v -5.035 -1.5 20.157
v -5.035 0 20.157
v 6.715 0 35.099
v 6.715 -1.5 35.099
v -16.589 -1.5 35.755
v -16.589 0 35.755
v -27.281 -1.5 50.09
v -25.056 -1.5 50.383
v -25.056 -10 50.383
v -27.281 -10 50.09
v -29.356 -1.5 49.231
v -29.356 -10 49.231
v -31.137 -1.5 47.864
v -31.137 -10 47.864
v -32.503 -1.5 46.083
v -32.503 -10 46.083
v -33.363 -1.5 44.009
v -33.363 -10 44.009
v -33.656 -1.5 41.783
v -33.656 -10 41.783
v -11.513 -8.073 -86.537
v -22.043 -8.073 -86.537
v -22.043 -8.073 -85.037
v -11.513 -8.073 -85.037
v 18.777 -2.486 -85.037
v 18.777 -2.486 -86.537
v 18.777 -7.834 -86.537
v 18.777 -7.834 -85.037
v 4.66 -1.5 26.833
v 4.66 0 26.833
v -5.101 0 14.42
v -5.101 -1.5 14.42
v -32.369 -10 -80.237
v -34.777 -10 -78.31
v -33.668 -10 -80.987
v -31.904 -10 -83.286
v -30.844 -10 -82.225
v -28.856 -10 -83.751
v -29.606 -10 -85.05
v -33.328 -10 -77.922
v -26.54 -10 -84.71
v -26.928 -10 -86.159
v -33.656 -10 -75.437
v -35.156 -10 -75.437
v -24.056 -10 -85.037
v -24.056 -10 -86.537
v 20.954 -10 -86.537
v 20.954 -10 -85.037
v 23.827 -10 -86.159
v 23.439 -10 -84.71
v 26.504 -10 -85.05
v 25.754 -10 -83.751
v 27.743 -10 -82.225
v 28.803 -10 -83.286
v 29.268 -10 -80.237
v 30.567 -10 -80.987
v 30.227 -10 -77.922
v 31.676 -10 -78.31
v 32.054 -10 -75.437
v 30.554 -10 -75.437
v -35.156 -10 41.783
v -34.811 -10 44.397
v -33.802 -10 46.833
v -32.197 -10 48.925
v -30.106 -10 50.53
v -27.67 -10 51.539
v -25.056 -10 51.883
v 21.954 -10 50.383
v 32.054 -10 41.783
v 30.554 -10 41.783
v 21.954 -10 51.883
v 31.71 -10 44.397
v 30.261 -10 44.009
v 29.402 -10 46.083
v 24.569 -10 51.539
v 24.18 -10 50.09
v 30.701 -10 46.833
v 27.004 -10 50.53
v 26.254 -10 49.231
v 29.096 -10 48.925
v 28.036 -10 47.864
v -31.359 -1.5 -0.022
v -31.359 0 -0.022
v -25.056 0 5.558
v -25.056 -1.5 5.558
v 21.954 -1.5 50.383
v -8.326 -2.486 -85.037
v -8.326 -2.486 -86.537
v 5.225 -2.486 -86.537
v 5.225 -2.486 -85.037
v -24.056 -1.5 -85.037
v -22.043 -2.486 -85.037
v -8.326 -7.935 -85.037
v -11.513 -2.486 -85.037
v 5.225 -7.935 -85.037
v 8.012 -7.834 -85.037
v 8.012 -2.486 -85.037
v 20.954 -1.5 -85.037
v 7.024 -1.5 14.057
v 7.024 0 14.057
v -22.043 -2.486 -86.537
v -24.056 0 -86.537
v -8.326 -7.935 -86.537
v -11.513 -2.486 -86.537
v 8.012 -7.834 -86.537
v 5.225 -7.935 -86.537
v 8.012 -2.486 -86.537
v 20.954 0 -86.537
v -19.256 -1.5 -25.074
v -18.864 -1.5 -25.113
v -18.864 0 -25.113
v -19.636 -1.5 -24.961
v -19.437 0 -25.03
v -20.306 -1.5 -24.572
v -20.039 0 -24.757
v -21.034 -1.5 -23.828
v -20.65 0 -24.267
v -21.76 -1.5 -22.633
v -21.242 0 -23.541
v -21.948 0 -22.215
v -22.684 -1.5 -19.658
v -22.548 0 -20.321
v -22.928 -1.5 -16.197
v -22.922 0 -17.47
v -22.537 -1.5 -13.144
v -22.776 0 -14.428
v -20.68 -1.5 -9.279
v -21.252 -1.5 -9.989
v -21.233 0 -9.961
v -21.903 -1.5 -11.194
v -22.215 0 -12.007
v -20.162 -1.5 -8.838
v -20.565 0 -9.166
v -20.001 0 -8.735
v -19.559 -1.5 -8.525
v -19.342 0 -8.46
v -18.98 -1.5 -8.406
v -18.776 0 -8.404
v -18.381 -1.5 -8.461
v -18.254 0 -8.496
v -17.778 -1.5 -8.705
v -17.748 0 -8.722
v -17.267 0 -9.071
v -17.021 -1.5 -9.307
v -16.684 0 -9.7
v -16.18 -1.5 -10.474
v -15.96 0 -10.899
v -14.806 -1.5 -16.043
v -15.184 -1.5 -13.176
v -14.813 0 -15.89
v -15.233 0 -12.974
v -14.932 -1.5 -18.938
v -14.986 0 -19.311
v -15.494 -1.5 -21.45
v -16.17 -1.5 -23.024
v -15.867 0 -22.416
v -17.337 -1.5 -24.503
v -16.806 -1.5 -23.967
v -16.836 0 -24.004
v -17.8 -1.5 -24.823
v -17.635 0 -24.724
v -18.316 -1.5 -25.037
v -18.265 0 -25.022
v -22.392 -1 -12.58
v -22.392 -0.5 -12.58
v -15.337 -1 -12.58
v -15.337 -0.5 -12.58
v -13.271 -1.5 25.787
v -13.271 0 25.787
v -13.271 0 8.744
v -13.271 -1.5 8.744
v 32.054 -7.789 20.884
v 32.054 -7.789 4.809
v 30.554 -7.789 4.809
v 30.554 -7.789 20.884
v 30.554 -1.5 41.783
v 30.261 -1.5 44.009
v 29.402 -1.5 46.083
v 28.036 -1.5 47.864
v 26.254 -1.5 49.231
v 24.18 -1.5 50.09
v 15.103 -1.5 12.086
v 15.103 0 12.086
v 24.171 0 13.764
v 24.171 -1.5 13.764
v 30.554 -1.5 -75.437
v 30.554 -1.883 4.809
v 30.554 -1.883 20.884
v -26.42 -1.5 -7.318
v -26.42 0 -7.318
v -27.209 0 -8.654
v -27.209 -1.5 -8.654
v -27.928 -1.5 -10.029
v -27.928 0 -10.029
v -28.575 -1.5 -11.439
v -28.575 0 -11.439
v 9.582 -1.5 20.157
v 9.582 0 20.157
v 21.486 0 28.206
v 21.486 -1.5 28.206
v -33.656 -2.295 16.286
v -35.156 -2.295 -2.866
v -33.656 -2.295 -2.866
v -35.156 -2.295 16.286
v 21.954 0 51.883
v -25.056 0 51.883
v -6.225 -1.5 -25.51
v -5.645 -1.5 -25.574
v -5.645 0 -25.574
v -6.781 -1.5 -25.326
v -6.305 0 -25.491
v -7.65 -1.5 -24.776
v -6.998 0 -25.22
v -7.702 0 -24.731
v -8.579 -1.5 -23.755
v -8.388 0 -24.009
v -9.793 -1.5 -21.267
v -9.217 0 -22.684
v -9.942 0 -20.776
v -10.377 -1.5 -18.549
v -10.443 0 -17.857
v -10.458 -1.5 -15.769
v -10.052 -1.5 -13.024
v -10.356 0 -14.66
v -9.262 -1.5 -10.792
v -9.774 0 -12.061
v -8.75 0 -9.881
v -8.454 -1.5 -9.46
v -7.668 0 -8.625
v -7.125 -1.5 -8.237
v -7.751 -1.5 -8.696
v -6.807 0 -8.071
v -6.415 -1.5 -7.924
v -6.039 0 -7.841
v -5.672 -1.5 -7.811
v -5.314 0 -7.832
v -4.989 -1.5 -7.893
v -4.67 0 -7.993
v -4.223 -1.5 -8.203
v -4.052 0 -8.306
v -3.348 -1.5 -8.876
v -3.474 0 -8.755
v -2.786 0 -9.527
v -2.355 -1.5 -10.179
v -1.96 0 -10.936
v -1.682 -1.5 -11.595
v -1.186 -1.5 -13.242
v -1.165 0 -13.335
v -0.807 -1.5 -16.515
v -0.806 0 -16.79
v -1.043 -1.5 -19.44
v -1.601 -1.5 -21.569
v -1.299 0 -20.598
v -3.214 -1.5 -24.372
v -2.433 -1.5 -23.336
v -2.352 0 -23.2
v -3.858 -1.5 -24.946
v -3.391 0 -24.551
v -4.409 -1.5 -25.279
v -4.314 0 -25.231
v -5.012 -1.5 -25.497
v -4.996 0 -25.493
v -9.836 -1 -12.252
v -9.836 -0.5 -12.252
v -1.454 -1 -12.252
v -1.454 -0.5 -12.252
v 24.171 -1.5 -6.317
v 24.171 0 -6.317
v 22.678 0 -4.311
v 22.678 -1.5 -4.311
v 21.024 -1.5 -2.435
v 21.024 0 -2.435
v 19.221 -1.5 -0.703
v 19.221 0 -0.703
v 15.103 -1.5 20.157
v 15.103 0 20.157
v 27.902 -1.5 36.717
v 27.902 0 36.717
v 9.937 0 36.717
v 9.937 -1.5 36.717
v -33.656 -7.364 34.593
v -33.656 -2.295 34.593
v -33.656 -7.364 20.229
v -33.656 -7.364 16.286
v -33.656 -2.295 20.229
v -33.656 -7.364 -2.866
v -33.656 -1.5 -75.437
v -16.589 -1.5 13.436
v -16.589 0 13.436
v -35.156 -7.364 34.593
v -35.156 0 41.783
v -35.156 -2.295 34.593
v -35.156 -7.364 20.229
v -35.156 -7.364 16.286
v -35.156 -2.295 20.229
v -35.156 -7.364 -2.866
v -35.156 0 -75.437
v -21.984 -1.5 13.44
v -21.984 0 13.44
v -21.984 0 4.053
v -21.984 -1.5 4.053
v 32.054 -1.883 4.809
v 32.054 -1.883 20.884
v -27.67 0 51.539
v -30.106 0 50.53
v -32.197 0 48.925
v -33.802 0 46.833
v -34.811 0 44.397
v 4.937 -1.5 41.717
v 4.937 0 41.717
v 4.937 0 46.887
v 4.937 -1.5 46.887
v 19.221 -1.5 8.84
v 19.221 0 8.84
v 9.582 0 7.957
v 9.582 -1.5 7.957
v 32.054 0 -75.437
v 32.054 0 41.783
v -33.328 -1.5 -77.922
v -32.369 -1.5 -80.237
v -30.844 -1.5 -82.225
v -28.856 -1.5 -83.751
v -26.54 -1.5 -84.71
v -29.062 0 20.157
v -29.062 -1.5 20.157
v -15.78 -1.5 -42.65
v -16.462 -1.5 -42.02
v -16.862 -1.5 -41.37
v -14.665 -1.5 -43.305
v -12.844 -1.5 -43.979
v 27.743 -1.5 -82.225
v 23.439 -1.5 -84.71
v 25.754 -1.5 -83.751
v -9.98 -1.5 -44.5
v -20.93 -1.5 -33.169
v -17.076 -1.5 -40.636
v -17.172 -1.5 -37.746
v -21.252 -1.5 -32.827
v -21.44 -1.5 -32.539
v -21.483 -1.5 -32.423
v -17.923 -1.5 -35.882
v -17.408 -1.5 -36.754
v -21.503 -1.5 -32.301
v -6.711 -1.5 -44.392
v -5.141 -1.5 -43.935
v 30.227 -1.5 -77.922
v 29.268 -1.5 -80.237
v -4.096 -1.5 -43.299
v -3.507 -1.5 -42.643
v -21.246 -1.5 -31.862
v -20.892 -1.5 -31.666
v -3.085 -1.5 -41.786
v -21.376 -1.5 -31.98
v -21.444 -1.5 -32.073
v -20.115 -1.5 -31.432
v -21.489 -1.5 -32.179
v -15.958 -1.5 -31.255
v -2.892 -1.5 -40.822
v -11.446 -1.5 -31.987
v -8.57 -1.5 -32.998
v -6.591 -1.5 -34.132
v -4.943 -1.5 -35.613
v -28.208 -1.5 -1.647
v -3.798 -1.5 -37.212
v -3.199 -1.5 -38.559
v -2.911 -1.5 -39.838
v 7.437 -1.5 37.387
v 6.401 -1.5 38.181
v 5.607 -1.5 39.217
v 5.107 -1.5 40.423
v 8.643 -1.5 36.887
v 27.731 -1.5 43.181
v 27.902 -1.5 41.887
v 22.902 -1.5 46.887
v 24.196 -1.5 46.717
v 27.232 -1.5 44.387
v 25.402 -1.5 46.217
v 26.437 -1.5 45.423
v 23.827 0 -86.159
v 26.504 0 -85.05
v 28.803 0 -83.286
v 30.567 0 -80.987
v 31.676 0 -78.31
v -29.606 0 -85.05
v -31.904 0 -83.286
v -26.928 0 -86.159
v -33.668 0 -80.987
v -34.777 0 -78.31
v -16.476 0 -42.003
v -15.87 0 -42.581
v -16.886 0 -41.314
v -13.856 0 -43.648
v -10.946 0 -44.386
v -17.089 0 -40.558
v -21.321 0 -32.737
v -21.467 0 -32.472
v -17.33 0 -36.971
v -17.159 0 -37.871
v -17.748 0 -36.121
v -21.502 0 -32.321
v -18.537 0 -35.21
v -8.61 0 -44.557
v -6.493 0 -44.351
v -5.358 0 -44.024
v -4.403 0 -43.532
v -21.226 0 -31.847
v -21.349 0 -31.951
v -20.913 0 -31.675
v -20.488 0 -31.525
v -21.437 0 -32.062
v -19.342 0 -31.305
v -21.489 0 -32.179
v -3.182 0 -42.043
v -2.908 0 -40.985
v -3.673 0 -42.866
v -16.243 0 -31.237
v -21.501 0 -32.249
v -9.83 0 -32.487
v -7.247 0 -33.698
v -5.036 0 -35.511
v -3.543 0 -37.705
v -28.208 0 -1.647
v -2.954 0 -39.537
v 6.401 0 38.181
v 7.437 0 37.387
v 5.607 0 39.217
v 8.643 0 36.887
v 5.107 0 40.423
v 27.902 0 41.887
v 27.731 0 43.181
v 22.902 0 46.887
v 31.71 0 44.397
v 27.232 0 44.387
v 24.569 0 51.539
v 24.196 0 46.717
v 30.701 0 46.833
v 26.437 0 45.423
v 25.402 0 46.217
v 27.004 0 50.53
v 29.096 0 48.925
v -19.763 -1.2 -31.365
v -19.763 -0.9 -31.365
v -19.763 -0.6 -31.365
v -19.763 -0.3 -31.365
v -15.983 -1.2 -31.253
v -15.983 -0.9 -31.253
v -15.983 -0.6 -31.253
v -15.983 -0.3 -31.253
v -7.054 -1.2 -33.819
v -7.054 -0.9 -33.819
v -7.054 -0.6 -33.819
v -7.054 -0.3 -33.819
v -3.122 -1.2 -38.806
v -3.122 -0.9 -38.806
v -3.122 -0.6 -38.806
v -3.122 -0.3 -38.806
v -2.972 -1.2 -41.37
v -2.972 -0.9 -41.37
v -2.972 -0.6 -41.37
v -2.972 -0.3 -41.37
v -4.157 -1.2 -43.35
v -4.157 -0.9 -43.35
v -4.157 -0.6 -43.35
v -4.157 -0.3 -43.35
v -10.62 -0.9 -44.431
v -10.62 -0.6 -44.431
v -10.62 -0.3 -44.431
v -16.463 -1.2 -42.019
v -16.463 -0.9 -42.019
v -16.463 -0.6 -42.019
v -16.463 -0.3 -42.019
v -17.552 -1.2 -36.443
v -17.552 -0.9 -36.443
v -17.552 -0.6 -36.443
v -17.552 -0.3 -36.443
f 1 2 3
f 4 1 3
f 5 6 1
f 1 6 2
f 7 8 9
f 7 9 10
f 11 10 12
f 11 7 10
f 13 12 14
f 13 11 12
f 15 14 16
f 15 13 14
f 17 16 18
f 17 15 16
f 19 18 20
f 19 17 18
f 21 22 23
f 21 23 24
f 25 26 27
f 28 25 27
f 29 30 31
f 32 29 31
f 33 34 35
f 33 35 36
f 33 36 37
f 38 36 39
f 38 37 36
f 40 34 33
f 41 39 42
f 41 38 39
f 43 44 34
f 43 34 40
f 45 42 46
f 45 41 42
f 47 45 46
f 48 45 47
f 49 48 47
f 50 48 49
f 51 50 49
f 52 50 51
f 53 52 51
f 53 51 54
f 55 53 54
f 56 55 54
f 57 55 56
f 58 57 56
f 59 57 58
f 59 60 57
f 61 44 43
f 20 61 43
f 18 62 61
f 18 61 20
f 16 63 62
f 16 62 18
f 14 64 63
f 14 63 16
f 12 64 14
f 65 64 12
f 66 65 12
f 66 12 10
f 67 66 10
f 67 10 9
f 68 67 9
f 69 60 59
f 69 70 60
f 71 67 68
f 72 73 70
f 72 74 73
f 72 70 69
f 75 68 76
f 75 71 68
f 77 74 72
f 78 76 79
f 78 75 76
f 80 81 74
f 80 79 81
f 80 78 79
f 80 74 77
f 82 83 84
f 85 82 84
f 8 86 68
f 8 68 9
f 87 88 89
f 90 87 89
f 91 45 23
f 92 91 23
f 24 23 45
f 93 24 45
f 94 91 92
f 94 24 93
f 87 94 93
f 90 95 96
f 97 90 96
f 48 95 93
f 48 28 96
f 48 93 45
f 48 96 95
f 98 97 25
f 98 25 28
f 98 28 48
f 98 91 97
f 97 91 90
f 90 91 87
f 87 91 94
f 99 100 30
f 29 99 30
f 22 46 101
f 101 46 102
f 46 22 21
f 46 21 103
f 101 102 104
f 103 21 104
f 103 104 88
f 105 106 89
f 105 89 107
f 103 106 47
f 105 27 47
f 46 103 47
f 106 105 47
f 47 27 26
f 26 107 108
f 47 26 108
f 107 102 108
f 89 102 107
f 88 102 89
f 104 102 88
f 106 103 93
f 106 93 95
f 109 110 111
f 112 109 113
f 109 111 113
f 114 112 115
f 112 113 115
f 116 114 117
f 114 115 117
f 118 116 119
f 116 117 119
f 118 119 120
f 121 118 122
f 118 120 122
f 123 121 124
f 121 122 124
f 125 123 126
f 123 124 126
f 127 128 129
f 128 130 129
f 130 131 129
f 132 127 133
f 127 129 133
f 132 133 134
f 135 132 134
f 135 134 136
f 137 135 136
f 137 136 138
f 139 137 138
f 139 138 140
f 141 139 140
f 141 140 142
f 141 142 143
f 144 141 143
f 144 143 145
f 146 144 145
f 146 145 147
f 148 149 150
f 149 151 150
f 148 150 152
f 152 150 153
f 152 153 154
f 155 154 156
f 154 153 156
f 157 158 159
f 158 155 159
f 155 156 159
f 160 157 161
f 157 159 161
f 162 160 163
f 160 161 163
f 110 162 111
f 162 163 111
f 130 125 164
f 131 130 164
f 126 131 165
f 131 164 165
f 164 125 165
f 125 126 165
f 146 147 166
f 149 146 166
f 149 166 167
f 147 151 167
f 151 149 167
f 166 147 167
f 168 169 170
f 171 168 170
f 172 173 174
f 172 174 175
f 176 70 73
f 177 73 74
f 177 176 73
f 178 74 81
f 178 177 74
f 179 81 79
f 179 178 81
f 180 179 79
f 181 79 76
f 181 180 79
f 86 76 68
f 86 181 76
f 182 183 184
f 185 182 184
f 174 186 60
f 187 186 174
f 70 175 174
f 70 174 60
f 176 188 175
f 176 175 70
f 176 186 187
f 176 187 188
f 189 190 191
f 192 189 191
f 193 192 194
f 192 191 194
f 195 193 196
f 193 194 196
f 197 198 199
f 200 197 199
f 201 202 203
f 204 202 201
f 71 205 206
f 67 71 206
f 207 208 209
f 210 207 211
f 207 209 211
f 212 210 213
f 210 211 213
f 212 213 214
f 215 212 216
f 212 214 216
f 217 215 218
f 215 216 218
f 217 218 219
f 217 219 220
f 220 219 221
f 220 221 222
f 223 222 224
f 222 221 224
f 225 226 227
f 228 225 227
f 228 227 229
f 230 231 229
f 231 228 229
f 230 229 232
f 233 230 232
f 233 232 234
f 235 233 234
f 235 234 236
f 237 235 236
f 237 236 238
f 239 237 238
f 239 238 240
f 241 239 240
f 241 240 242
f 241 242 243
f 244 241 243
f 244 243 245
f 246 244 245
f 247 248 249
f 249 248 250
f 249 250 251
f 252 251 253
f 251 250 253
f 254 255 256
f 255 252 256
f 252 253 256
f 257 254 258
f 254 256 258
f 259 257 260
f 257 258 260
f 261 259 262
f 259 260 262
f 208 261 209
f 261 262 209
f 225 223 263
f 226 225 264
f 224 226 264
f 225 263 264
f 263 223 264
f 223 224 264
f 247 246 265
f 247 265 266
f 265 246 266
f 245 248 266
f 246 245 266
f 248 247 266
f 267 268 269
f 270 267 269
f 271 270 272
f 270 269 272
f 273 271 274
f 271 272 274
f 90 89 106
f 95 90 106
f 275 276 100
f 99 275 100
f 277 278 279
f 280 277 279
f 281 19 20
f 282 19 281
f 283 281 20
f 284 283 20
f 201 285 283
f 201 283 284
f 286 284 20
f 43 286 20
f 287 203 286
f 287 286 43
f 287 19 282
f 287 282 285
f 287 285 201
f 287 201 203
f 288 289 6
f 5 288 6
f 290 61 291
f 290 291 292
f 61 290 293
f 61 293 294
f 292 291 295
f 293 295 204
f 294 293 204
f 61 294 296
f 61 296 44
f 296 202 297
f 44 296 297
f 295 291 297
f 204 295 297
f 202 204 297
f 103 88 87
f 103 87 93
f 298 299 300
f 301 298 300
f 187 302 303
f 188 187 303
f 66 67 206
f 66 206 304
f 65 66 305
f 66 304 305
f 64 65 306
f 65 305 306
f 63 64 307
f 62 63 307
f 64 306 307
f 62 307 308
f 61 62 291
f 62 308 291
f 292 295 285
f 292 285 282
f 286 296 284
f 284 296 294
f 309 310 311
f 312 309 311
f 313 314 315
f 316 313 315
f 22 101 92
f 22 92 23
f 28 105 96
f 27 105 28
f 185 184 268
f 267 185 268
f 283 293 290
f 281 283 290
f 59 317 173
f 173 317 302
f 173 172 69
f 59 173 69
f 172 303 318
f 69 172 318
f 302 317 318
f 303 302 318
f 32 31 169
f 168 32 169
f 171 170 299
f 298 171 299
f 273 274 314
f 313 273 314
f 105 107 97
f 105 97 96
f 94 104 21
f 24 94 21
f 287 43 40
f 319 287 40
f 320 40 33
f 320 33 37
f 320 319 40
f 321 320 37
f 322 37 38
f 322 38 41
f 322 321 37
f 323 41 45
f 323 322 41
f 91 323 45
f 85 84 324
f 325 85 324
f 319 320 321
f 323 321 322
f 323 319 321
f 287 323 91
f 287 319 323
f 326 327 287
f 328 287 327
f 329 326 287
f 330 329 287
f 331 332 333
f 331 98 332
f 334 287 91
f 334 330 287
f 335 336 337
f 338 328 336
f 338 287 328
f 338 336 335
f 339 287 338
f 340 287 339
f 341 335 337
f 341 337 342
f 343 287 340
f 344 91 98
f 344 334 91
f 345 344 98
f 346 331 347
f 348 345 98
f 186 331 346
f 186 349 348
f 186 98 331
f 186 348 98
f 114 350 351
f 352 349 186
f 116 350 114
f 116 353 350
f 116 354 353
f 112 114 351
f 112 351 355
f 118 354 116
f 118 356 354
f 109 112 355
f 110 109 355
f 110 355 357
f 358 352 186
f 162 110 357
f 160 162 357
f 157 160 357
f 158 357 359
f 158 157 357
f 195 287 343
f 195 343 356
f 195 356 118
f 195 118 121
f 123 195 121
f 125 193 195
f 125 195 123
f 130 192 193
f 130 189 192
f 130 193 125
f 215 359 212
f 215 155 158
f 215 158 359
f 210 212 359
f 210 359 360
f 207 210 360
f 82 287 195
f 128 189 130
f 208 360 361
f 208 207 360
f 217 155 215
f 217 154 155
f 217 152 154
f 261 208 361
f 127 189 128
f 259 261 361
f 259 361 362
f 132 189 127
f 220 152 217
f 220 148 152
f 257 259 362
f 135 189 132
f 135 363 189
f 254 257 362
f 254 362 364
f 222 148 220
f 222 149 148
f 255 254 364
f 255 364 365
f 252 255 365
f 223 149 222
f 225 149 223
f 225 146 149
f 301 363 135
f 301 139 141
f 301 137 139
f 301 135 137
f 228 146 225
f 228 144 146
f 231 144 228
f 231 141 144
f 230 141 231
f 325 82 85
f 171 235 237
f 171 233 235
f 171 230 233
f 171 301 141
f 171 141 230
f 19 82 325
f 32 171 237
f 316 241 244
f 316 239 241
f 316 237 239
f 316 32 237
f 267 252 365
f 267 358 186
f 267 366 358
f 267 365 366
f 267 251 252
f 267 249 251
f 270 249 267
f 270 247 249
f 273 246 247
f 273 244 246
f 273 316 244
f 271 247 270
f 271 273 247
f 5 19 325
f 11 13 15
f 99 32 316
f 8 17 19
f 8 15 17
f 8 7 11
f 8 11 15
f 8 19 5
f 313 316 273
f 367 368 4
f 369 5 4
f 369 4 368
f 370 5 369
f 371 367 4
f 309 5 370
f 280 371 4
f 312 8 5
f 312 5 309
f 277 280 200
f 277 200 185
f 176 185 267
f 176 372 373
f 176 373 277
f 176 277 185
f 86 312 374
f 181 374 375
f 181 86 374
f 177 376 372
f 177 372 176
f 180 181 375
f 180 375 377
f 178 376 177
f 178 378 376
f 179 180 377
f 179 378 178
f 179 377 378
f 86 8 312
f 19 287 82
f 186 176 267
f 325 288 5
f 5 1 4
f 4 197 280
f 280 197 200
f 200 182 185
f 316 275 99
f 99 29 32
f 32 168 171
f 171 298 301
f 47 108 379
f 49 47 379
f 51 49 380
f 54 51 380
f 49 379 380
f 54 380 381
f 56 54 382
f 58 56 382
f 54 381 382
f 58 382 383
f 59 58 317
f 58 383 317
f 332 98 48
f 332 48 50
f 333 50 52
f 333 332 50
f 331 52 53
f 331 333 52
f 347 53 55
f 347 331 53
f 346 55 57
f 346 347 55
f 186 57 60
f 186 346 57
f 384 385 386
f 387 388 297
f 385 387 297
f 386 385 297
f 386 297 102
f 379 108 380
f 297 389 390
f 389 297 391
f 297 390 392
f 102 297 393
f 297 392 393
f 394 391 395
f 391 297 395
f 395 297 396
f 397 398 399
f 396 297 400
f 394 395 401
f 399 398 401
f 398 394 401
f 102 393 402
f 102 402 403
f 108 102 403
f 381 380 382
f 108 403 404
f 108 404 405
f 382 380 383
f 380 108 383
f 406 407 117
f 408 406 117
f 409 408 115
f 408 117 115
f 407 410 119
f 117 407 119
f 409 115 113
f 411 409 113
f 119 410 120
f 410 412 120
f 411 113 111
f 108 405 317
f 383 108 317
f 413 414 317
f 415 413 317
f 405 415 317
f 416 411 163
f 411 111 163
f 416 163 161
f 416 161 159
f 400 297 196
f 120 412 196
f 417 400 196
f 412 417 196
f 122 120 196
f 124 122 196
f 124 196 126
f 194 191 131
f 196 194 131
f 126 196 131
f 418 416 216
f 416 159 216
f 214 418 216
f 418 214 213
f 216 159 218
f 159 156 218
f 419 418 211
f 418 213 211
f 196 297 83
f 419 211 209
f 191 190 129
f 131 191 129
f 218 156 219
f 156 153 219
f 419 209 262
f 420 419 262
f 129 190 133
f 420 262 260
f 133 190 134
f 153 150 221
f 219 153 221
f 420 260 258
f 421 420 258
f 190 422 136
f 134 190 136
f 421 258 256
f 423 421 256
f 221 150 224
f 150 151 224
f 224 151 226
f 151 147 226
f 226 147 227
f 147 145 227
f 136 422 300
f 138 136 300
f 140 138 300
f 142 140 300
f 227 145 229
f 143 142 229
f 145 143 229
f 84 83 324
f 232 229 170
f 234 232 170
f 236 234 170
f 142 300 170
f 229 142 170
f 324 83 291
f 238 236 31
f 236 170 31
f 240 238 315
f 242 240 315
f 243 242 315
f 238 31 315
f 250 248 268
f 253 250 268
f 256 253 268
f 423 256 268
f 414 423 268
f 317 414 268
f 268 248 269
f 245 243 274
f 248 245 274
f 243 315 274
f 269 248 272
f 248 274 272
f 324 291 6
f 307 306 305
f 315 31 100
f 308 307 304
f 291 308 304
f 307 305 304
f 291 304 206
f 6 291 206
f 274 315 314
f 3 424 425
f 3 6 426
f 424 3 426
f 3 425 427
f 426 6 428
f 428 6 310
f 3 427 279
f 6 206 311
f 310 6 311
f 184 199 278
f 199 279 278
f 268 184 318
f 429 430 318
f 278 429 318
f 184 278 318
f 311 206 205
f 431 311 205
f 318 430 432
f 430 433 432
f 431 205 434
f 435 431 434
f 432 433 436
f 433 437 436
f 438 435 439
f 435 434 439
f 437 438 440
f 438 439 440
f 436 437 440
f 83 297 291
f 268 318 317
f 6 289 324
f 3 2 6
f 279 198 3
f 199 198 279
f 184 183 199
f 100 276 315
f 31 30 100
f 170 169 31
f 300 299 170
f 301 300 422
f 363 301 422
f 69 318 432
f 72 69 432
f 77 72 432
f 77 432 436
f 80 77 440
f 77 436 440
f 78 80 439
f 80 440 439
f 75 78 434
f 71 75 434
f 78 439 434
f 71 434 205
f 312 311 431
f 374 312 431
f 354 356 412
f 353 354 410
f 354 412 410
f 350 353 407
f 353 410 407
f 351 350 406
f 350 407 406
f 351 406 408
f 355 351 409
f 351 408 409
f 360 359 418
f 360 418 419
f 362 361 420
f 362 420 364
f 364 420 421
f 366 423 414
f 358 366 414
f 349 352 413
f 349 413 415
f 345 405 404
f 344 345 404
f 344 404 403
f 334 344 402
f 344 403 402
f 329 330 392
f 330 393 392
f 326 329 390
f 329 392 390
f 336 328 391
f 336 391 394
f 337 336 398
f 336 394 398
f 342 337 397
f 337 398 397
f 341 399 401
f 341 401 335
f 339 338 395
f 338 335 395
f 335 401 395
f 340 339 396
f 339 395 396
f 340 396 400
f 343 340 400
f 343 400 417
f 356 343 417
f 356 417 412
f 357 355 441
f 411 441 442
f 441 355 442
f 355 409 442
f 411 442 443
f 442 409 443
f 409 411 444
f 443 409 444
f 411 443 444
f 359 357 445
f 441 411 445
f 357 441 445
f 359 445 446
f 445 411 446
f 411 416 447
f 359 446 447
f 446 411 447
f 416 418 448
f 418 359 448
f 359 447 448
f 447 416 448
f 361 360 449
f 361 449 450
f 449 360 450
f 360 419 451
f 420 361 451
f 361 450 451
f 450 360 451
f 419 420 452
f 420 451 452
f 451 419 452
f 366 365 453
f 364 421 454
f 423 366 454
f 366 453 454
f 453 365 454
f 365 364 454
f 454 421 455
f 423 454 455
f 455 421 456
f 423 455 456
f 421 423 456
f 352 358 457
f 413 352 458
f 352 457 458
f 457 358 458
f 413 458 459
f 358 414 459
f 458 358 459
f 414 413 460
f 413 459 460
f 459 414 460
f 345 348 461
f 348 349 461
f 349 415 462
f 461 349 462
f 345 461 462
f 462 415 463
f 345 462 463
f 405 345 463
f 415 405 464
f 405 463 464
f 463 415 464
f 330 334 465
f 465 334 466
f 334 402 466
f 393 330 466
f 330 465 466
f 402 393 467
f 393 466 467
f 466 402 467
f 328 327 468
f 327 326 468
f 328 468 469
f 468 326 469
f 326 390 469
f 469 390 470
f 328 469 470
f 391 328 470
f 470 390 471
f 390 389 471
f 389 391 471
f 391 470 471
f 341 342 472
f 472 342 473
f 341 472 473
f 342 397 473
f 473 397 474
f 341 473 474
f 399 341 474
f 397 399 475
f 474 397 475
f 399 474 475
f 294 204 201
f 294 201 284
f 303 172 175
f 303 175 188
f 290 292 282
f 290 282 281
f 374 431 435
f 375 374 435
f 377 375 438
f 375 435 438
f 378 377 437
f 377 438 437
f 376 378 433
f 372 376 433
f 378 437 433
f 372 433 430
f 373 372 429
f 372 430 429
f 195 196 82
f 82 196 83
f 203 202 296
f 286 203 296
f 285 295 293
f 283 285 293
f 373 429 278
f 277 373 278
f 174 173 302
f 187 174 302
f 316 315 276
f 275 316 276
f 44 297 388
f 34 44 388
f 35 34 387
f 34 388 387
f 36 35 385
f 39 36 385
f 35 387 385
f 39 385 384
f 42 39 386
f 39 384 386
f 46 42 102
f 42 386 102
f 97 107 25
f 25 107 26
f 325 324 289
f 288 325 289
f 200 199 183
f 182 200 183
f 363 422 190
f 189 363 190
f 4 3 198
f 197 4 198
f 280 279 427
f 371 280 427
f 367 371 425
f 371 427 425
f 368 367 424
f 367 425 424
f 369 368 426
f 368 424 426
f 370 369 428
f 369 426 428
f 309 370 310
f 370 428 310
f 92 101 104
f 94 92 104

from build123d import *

# Parameters (mm, degrees)
F1_DEPTH  = 10
F2_T      = -2.5
F4_DEPTH  = 25
F5_DEPTH  = 10
F6_DEPTH  = 10
F7_T      = -1.5
F8_W      = 5.0696202088
F8_H      = 19.1518978681
F8_H_2    = 14.3639231101
F9_DEPTH  = 25
F10_W     = 10.5292941444
F10_H     = 5.5865490576
F10_W_2   = 13.5512258646
F10_H_2   = 5.4485995788
F10_W_3   = 10.7643418014
F10_H_3   = 5.3474996239
F11_DEPTH = 25
F12_W     = 5.9053241275
F12_H     = 16.0756031983
F13_DEPTH = 10
F15_DEPTH = 25
F17_DEPTH = 25


with BuildPart() as f1:
    # F0 (on Front) → F1 (new body)
    with BuildSketch(Plane.XZ):
        with BuildLine():
            Line((21.9544503482, 51.8828080004), (-25.0555496518, 51.8828080004))
            ThreePointArc((-25.0555496518, 51.8828080004), (-32.1973281418, 48.9245864904), (-35.1555496518, 41.7828080004))
            Line((-35.1555496518, 41.7828080004), (-35.1555496518, -75.4371919996))
            ThreePointArc((-35.1555496518, -75.4371919996), (-31.904434923, -83.2860772707), (-24.0555496518, -86.5371919996))
            Line((-24.0555496518, -86.5371919996), (20.9544503482, -86.5371919996))
            ThreePointArc((20.9544503482, -86.5371919996), (28.8033356193, -83.2860772707), (32.0544503482, -75.4371919996))
            Line((32.0544503482, -75.4371919996), (32.0544503482, 41.7828080004))
            ThreePointArc((32.0544503482, 41.7828080004), (29.0962288381, 48.9245864904), (21.9544503482, 51.8828080004))
        make_face()
    extrude(amount=F1_DEPTH)

    # F2
    f2_openings = [f1.faces().sort_by_distance(p)[0] for p in [
        (-1.55055, -10, -17.262302),
    ]]
    offset(amount=F2_T, openings=f2_openings)

    # F4 (cut): a face of the model
    f4_faces = [f1.faces().sort_by_distance(p)[0] for p in [
        (-1.5505496518, -2.5, -17.2732166404),
    ]]
    extrude(f4_faces, amount=-F4_DEPTH, mode=Mode.SUBTRACT)

    # F0 (on Front) → F5 (join)
    with BuildSketch(Plane.XZ):
        with BuildLine():
            Line((21.9544503482, 51.8828080004), (-25.0555496518, 51.8828080004))
            ThreePointArc((-25.0555496518, 51.8828080004), (-32.1973281418, 48.9245864904), (-35.1555496518, 41.7828080004))
            Line((-35.1555496518, 41.7828080004), (-35.1555496518, -75.4371919996))
            ThreePointArc((-35.1555496518, -75.4371919996), (-31.904434923, -83.2860772707), (-24.0555496518, -86.5371919996))
            Line((-24.0555496518, -86.5371919996), (20.9544503482, -86.5371919996))
            ThreePointArc((20.9544503482, -86.5371919996), (28.8033356193, -83.2860772707), (32.0544503482, -75.4371919996))
            Line((32.0544503482, -75.4371919996), (32.0544503482, 41.7828080004))
            ThreePointArc((32.0544503482, 41.7828080004), (29.0962288381, 48.9245864904), (21.9544503482, 51.8828080004))
        make_face()
    extrude(amount=F5_DEPTH)

    # F0 (on Front) → F6 (join)
    with BuildSketch(Plane.XZ):
        with BuildLine():
            Line((21.9544503482, 51.8828080004), (-25.0555496518, 51.8828080004))
            ThreePointArc((-25.0555496518, 51.8828080004), (-32.1973281418, 48.9245864904), (-35.1555496518, 41.7828080004))
            Line((-35.1555496518, 41.7828080004), (-35.1555496518, -75.4371919996))
            ThreePointArc((-35.1555496518, -75.4371919996), (-31.904434923, -83.2860772707), (-24.0555496518, -86.5371919996))
            Line((-24.0555496518, -86.5371919996), (20.9544503482, -86.5371919996))
            ThreePointArc((20.9544503482, -86.5371919996), (28.8033356193, -83.2860772707), (32.0544503482, -75.4371919996))
            Line((32.0544503482, -75.4371919996), (32.0544503482, 41.7828080004))
            ThreePointArc((32.0544503482, 41.7828080004), (29.0962288381, 48.9245864904), (21.9544503482, 51.8828080004))
        make_face()
    extrude(amount=F6_DEPTH)

    # F7
    f7_openings = [f1.faces().sort_by_distance(p)[0] for p in [
        (-1.55055, -10, -17.262302),
    ]]
    offset(amount=F7_T, openings=f7_openings)

    # F8 (on face) → F9 (cut)
    with BuildSketch(Plane(origin=(-35.1555496518, 0, 0), x_dir=(0, -1, 0), z_dir=(-1, 0, 0))):
        with Locations((4.8295374727, 6.7098989384)):
            Rectangle(F8_W, F8_H)
        with Locations((4.8295374727, 27.4108457379)):
            Rectangle(F8_W, F8_H_2)
    extrude(amount=-F9_DEPTH, mode=Mode.SUBTRACT)

    # F10 (on face) → F11 (cut)
    with BuildSketch(Plane(origin=(0, 0, -86.5371919996), x_dir=(1, 0, 0), z_dir=(0, 0, -1))):
        with Locations((-16.7780660558, 5.2797452663)):
            Rectangle(F10_W, F10_H)
        with Locations((-1.5505496518, 5.2107705269)):
            Rectangle(F10_W_2, F10_H_2)
        with Locations((13.3945420384, 5.1602205494)):
            Rectangle(F10_W_3, F10_H_3)
    extrude(amount=-F11_DEPTH, mode=Mode.SUBTRACT)

    # F12 (on face) → F13 (cut)
    with BuildSketch(Plane.YZ.offset(32.0544503482)):
        with Locations((-4.8359625507, 12.8464607988)):
            Rectangle(F12_W, F12_H)
    extrude(amount=-F13_DEPTH, mode=Mode.SUBTRACT)

    # F14 (on face) → F15 (cut)
    with BuildSketch(Plane(origin=(0, 0, 0), x_dir=(-1, 0, 0), z_dir=(0, 1, 0))):
        with BuildLine():
            Line((-4.9367016181, 41.7169417441), (-4.9367016181, 46.8872189522))
            Line((-4.9367016181, 46.8872189522), (-22.9018543661, 46.8872189522))
            ThreePointArc((-22.9018543661, 46.8872189522), (-26.437388272, 45.4227528581), (-27.9018543661, 41.8872189522))
            Line((-27.9018543661, 41.8872189522), (-27.9018543661, 36.7169417441))
            Line((-27.9018543661, 36.7169417441), (-9.9367016181, 36.7169417441))
            ThreePointArc((-9.9367016181, 36.7169417441), (-6.4011677122, 38.1814078382), (-4.9367016181, 41.7169417441))
        make_face()
    extrude(amount=-F15_DEPTH, mode=Mode.SUBTRACT)

    # F16 (on face) → F17 (cut)
    with BuildSketch(Plane(origin=(0, 0, 0), x_dir=(-1, 0, 0), z_dir=(0, 1, 0))):
        with BuildLine():
            ThreePointArc((26.4200529613, -7.3176028738), (27.5771721965, -9.3368857226), (28.5754660633, -11.4392266806))
            Line((28.5754660633, -11.4392266806), (31.3594639301, -0.0217765737))
            Line((31.3594639301, -0.0217765737), (25.0555496518, 5.558159668))
            Line((25.0555496518, 5.558159668), (29.0618427098, 20.1572801091))
            Line((29.0618427098, 20.1572801091), (16.5890399367, 13.4357167408))
            Line((16.5890399367, 13.4357167408), (16.5890399367, 35.7554629445))
            Line((16.5890399367, 35.7554629445), (5.0351630362, 20.1572801091))
            Line((5.0351630362, 20.1572801091), (-6.7154015414, 35.0989997387))
            Line((-6.7154015414, 35.0989997387), (-9.5820732453, 20.1572801091))
            Line((-9.5820732453, 20.1572801091), (-21.48581855, 28.2061360776))
            Line((-21.48581855, 28.2061360776), (-15.1034205345, 12.0860713894))
            Line((-15.1034205345, 12.0860713894), (-24.1708188182, 13.7639517974))
            Line((-24.1708188182, 13.7639517974), (-24.1708188182, -6.3168395026))
            ThreePointArc((-24.1708188182, -6.3168395026), (-21.870462247, -3.3559524745), (-19.2211569677, -0.7027140973))
            Line((-19.2211569677, -0.7027140973), (-19.2211569677, 8.8404889854))
            Line((-19.2211569677, 8.8404889854), (-9.5820732453, 7.9569982246))
            Line((-9.5820732453, 7.9569982246), (-15.1034205345, 20.1572801091))
            Line((-15.1034205345, 20.1572801091), (-7.0243359757, 14.0571391668))
            Line((-7.0243359757, 14.0571391668), (-4.6603031142, 26.8325595181))
            Line((-4.6603031142, 26.8325595181), (5.1009384915, 14.4204124808))
            Line((5.1009384915, 14.4204124808), (13.2710309699, 25.7874978435))
            Line((13.2710309699, 25.7874978435), (13.2710309699, 8.7444344535))
            Line((13.2710309699, 8.7444344535), (21.9839378688, 13.4397989926))
            Line((21.9839378688, 13.4397989926), (21.9839378688, 4.052773118))
            Line((21.9839378688, 4.052773118), (28.207506791, -1.6472467687))
            Line((28.207506791, -1.6472467687), (26.4200529613, -7.3176028738))
        make_face()
        with BuildLine():
            add(Edge.make_bspline(
                [(5.6451442651, -25.5737133837), (14.0268319161, -25.5737133837), (9.8359880906, -12.2517921706), (5.6451442651, 1.0701290425), (1.4543004397, -12.2517921706), (-2.7365433858, -25.5737133837), (5.6451442651, -25.5737133837)],
                knots=[0, 0, 0, 2.0943951024, 2.0943951024, 4.1887902048, 4.1887902048, 6.2831853072, 6.2831853072, 6.2831853072], degree=2, weights=[1, 0.5, 1, 0.5, 1, 0.5, 1]))
        make_face()
        with BuildLine():
            add(Edge.make_bspline(
                [(18.8640544657, -25.1127919182), (25.9189664889, -25.1127919182), (22.3915104773, -12.5799663365), (18.8640544657, -0.0471407548), (15.336598454, -12.5799663365), (11.8091424424, -25.1127919182), (18.8640544657, -25.1127919182)],
                knots=[0, 0, 0, 2.0943951024, 2.0943951024, 4.1887902048, 4.1887902048, 6.2831853072, 6.2831853072, 6.2831853072], degree=2, weights=[1, 0.5, 1, 0.5, 1, 0.5, 1]))
        make_face()
        with BuildLine():
            add(Edge.make_bspline(
                [(21.4888192713, -32.1785211563), (21.0886401041, -30.7026737238), (4.5085240404, -30.586525108), (0.1995471756, -46.7222859215), (19.5934373704, -43.5732098518), (15.3544410875, -36.0896016912), (21.741761386, -33.1113632456), (21.4888192713, -32.1785211563)],
                knots=[0, 0, 0, 0, 0.249472055, 0.4560450882, 0.6863086185, 0.8423156569, 1, 1, 1, 1], degree=3))
        make_face()
    extrude(amount=-F17_DEPTH, mode=Mode.SUBTRACT)


solid = f1.part
